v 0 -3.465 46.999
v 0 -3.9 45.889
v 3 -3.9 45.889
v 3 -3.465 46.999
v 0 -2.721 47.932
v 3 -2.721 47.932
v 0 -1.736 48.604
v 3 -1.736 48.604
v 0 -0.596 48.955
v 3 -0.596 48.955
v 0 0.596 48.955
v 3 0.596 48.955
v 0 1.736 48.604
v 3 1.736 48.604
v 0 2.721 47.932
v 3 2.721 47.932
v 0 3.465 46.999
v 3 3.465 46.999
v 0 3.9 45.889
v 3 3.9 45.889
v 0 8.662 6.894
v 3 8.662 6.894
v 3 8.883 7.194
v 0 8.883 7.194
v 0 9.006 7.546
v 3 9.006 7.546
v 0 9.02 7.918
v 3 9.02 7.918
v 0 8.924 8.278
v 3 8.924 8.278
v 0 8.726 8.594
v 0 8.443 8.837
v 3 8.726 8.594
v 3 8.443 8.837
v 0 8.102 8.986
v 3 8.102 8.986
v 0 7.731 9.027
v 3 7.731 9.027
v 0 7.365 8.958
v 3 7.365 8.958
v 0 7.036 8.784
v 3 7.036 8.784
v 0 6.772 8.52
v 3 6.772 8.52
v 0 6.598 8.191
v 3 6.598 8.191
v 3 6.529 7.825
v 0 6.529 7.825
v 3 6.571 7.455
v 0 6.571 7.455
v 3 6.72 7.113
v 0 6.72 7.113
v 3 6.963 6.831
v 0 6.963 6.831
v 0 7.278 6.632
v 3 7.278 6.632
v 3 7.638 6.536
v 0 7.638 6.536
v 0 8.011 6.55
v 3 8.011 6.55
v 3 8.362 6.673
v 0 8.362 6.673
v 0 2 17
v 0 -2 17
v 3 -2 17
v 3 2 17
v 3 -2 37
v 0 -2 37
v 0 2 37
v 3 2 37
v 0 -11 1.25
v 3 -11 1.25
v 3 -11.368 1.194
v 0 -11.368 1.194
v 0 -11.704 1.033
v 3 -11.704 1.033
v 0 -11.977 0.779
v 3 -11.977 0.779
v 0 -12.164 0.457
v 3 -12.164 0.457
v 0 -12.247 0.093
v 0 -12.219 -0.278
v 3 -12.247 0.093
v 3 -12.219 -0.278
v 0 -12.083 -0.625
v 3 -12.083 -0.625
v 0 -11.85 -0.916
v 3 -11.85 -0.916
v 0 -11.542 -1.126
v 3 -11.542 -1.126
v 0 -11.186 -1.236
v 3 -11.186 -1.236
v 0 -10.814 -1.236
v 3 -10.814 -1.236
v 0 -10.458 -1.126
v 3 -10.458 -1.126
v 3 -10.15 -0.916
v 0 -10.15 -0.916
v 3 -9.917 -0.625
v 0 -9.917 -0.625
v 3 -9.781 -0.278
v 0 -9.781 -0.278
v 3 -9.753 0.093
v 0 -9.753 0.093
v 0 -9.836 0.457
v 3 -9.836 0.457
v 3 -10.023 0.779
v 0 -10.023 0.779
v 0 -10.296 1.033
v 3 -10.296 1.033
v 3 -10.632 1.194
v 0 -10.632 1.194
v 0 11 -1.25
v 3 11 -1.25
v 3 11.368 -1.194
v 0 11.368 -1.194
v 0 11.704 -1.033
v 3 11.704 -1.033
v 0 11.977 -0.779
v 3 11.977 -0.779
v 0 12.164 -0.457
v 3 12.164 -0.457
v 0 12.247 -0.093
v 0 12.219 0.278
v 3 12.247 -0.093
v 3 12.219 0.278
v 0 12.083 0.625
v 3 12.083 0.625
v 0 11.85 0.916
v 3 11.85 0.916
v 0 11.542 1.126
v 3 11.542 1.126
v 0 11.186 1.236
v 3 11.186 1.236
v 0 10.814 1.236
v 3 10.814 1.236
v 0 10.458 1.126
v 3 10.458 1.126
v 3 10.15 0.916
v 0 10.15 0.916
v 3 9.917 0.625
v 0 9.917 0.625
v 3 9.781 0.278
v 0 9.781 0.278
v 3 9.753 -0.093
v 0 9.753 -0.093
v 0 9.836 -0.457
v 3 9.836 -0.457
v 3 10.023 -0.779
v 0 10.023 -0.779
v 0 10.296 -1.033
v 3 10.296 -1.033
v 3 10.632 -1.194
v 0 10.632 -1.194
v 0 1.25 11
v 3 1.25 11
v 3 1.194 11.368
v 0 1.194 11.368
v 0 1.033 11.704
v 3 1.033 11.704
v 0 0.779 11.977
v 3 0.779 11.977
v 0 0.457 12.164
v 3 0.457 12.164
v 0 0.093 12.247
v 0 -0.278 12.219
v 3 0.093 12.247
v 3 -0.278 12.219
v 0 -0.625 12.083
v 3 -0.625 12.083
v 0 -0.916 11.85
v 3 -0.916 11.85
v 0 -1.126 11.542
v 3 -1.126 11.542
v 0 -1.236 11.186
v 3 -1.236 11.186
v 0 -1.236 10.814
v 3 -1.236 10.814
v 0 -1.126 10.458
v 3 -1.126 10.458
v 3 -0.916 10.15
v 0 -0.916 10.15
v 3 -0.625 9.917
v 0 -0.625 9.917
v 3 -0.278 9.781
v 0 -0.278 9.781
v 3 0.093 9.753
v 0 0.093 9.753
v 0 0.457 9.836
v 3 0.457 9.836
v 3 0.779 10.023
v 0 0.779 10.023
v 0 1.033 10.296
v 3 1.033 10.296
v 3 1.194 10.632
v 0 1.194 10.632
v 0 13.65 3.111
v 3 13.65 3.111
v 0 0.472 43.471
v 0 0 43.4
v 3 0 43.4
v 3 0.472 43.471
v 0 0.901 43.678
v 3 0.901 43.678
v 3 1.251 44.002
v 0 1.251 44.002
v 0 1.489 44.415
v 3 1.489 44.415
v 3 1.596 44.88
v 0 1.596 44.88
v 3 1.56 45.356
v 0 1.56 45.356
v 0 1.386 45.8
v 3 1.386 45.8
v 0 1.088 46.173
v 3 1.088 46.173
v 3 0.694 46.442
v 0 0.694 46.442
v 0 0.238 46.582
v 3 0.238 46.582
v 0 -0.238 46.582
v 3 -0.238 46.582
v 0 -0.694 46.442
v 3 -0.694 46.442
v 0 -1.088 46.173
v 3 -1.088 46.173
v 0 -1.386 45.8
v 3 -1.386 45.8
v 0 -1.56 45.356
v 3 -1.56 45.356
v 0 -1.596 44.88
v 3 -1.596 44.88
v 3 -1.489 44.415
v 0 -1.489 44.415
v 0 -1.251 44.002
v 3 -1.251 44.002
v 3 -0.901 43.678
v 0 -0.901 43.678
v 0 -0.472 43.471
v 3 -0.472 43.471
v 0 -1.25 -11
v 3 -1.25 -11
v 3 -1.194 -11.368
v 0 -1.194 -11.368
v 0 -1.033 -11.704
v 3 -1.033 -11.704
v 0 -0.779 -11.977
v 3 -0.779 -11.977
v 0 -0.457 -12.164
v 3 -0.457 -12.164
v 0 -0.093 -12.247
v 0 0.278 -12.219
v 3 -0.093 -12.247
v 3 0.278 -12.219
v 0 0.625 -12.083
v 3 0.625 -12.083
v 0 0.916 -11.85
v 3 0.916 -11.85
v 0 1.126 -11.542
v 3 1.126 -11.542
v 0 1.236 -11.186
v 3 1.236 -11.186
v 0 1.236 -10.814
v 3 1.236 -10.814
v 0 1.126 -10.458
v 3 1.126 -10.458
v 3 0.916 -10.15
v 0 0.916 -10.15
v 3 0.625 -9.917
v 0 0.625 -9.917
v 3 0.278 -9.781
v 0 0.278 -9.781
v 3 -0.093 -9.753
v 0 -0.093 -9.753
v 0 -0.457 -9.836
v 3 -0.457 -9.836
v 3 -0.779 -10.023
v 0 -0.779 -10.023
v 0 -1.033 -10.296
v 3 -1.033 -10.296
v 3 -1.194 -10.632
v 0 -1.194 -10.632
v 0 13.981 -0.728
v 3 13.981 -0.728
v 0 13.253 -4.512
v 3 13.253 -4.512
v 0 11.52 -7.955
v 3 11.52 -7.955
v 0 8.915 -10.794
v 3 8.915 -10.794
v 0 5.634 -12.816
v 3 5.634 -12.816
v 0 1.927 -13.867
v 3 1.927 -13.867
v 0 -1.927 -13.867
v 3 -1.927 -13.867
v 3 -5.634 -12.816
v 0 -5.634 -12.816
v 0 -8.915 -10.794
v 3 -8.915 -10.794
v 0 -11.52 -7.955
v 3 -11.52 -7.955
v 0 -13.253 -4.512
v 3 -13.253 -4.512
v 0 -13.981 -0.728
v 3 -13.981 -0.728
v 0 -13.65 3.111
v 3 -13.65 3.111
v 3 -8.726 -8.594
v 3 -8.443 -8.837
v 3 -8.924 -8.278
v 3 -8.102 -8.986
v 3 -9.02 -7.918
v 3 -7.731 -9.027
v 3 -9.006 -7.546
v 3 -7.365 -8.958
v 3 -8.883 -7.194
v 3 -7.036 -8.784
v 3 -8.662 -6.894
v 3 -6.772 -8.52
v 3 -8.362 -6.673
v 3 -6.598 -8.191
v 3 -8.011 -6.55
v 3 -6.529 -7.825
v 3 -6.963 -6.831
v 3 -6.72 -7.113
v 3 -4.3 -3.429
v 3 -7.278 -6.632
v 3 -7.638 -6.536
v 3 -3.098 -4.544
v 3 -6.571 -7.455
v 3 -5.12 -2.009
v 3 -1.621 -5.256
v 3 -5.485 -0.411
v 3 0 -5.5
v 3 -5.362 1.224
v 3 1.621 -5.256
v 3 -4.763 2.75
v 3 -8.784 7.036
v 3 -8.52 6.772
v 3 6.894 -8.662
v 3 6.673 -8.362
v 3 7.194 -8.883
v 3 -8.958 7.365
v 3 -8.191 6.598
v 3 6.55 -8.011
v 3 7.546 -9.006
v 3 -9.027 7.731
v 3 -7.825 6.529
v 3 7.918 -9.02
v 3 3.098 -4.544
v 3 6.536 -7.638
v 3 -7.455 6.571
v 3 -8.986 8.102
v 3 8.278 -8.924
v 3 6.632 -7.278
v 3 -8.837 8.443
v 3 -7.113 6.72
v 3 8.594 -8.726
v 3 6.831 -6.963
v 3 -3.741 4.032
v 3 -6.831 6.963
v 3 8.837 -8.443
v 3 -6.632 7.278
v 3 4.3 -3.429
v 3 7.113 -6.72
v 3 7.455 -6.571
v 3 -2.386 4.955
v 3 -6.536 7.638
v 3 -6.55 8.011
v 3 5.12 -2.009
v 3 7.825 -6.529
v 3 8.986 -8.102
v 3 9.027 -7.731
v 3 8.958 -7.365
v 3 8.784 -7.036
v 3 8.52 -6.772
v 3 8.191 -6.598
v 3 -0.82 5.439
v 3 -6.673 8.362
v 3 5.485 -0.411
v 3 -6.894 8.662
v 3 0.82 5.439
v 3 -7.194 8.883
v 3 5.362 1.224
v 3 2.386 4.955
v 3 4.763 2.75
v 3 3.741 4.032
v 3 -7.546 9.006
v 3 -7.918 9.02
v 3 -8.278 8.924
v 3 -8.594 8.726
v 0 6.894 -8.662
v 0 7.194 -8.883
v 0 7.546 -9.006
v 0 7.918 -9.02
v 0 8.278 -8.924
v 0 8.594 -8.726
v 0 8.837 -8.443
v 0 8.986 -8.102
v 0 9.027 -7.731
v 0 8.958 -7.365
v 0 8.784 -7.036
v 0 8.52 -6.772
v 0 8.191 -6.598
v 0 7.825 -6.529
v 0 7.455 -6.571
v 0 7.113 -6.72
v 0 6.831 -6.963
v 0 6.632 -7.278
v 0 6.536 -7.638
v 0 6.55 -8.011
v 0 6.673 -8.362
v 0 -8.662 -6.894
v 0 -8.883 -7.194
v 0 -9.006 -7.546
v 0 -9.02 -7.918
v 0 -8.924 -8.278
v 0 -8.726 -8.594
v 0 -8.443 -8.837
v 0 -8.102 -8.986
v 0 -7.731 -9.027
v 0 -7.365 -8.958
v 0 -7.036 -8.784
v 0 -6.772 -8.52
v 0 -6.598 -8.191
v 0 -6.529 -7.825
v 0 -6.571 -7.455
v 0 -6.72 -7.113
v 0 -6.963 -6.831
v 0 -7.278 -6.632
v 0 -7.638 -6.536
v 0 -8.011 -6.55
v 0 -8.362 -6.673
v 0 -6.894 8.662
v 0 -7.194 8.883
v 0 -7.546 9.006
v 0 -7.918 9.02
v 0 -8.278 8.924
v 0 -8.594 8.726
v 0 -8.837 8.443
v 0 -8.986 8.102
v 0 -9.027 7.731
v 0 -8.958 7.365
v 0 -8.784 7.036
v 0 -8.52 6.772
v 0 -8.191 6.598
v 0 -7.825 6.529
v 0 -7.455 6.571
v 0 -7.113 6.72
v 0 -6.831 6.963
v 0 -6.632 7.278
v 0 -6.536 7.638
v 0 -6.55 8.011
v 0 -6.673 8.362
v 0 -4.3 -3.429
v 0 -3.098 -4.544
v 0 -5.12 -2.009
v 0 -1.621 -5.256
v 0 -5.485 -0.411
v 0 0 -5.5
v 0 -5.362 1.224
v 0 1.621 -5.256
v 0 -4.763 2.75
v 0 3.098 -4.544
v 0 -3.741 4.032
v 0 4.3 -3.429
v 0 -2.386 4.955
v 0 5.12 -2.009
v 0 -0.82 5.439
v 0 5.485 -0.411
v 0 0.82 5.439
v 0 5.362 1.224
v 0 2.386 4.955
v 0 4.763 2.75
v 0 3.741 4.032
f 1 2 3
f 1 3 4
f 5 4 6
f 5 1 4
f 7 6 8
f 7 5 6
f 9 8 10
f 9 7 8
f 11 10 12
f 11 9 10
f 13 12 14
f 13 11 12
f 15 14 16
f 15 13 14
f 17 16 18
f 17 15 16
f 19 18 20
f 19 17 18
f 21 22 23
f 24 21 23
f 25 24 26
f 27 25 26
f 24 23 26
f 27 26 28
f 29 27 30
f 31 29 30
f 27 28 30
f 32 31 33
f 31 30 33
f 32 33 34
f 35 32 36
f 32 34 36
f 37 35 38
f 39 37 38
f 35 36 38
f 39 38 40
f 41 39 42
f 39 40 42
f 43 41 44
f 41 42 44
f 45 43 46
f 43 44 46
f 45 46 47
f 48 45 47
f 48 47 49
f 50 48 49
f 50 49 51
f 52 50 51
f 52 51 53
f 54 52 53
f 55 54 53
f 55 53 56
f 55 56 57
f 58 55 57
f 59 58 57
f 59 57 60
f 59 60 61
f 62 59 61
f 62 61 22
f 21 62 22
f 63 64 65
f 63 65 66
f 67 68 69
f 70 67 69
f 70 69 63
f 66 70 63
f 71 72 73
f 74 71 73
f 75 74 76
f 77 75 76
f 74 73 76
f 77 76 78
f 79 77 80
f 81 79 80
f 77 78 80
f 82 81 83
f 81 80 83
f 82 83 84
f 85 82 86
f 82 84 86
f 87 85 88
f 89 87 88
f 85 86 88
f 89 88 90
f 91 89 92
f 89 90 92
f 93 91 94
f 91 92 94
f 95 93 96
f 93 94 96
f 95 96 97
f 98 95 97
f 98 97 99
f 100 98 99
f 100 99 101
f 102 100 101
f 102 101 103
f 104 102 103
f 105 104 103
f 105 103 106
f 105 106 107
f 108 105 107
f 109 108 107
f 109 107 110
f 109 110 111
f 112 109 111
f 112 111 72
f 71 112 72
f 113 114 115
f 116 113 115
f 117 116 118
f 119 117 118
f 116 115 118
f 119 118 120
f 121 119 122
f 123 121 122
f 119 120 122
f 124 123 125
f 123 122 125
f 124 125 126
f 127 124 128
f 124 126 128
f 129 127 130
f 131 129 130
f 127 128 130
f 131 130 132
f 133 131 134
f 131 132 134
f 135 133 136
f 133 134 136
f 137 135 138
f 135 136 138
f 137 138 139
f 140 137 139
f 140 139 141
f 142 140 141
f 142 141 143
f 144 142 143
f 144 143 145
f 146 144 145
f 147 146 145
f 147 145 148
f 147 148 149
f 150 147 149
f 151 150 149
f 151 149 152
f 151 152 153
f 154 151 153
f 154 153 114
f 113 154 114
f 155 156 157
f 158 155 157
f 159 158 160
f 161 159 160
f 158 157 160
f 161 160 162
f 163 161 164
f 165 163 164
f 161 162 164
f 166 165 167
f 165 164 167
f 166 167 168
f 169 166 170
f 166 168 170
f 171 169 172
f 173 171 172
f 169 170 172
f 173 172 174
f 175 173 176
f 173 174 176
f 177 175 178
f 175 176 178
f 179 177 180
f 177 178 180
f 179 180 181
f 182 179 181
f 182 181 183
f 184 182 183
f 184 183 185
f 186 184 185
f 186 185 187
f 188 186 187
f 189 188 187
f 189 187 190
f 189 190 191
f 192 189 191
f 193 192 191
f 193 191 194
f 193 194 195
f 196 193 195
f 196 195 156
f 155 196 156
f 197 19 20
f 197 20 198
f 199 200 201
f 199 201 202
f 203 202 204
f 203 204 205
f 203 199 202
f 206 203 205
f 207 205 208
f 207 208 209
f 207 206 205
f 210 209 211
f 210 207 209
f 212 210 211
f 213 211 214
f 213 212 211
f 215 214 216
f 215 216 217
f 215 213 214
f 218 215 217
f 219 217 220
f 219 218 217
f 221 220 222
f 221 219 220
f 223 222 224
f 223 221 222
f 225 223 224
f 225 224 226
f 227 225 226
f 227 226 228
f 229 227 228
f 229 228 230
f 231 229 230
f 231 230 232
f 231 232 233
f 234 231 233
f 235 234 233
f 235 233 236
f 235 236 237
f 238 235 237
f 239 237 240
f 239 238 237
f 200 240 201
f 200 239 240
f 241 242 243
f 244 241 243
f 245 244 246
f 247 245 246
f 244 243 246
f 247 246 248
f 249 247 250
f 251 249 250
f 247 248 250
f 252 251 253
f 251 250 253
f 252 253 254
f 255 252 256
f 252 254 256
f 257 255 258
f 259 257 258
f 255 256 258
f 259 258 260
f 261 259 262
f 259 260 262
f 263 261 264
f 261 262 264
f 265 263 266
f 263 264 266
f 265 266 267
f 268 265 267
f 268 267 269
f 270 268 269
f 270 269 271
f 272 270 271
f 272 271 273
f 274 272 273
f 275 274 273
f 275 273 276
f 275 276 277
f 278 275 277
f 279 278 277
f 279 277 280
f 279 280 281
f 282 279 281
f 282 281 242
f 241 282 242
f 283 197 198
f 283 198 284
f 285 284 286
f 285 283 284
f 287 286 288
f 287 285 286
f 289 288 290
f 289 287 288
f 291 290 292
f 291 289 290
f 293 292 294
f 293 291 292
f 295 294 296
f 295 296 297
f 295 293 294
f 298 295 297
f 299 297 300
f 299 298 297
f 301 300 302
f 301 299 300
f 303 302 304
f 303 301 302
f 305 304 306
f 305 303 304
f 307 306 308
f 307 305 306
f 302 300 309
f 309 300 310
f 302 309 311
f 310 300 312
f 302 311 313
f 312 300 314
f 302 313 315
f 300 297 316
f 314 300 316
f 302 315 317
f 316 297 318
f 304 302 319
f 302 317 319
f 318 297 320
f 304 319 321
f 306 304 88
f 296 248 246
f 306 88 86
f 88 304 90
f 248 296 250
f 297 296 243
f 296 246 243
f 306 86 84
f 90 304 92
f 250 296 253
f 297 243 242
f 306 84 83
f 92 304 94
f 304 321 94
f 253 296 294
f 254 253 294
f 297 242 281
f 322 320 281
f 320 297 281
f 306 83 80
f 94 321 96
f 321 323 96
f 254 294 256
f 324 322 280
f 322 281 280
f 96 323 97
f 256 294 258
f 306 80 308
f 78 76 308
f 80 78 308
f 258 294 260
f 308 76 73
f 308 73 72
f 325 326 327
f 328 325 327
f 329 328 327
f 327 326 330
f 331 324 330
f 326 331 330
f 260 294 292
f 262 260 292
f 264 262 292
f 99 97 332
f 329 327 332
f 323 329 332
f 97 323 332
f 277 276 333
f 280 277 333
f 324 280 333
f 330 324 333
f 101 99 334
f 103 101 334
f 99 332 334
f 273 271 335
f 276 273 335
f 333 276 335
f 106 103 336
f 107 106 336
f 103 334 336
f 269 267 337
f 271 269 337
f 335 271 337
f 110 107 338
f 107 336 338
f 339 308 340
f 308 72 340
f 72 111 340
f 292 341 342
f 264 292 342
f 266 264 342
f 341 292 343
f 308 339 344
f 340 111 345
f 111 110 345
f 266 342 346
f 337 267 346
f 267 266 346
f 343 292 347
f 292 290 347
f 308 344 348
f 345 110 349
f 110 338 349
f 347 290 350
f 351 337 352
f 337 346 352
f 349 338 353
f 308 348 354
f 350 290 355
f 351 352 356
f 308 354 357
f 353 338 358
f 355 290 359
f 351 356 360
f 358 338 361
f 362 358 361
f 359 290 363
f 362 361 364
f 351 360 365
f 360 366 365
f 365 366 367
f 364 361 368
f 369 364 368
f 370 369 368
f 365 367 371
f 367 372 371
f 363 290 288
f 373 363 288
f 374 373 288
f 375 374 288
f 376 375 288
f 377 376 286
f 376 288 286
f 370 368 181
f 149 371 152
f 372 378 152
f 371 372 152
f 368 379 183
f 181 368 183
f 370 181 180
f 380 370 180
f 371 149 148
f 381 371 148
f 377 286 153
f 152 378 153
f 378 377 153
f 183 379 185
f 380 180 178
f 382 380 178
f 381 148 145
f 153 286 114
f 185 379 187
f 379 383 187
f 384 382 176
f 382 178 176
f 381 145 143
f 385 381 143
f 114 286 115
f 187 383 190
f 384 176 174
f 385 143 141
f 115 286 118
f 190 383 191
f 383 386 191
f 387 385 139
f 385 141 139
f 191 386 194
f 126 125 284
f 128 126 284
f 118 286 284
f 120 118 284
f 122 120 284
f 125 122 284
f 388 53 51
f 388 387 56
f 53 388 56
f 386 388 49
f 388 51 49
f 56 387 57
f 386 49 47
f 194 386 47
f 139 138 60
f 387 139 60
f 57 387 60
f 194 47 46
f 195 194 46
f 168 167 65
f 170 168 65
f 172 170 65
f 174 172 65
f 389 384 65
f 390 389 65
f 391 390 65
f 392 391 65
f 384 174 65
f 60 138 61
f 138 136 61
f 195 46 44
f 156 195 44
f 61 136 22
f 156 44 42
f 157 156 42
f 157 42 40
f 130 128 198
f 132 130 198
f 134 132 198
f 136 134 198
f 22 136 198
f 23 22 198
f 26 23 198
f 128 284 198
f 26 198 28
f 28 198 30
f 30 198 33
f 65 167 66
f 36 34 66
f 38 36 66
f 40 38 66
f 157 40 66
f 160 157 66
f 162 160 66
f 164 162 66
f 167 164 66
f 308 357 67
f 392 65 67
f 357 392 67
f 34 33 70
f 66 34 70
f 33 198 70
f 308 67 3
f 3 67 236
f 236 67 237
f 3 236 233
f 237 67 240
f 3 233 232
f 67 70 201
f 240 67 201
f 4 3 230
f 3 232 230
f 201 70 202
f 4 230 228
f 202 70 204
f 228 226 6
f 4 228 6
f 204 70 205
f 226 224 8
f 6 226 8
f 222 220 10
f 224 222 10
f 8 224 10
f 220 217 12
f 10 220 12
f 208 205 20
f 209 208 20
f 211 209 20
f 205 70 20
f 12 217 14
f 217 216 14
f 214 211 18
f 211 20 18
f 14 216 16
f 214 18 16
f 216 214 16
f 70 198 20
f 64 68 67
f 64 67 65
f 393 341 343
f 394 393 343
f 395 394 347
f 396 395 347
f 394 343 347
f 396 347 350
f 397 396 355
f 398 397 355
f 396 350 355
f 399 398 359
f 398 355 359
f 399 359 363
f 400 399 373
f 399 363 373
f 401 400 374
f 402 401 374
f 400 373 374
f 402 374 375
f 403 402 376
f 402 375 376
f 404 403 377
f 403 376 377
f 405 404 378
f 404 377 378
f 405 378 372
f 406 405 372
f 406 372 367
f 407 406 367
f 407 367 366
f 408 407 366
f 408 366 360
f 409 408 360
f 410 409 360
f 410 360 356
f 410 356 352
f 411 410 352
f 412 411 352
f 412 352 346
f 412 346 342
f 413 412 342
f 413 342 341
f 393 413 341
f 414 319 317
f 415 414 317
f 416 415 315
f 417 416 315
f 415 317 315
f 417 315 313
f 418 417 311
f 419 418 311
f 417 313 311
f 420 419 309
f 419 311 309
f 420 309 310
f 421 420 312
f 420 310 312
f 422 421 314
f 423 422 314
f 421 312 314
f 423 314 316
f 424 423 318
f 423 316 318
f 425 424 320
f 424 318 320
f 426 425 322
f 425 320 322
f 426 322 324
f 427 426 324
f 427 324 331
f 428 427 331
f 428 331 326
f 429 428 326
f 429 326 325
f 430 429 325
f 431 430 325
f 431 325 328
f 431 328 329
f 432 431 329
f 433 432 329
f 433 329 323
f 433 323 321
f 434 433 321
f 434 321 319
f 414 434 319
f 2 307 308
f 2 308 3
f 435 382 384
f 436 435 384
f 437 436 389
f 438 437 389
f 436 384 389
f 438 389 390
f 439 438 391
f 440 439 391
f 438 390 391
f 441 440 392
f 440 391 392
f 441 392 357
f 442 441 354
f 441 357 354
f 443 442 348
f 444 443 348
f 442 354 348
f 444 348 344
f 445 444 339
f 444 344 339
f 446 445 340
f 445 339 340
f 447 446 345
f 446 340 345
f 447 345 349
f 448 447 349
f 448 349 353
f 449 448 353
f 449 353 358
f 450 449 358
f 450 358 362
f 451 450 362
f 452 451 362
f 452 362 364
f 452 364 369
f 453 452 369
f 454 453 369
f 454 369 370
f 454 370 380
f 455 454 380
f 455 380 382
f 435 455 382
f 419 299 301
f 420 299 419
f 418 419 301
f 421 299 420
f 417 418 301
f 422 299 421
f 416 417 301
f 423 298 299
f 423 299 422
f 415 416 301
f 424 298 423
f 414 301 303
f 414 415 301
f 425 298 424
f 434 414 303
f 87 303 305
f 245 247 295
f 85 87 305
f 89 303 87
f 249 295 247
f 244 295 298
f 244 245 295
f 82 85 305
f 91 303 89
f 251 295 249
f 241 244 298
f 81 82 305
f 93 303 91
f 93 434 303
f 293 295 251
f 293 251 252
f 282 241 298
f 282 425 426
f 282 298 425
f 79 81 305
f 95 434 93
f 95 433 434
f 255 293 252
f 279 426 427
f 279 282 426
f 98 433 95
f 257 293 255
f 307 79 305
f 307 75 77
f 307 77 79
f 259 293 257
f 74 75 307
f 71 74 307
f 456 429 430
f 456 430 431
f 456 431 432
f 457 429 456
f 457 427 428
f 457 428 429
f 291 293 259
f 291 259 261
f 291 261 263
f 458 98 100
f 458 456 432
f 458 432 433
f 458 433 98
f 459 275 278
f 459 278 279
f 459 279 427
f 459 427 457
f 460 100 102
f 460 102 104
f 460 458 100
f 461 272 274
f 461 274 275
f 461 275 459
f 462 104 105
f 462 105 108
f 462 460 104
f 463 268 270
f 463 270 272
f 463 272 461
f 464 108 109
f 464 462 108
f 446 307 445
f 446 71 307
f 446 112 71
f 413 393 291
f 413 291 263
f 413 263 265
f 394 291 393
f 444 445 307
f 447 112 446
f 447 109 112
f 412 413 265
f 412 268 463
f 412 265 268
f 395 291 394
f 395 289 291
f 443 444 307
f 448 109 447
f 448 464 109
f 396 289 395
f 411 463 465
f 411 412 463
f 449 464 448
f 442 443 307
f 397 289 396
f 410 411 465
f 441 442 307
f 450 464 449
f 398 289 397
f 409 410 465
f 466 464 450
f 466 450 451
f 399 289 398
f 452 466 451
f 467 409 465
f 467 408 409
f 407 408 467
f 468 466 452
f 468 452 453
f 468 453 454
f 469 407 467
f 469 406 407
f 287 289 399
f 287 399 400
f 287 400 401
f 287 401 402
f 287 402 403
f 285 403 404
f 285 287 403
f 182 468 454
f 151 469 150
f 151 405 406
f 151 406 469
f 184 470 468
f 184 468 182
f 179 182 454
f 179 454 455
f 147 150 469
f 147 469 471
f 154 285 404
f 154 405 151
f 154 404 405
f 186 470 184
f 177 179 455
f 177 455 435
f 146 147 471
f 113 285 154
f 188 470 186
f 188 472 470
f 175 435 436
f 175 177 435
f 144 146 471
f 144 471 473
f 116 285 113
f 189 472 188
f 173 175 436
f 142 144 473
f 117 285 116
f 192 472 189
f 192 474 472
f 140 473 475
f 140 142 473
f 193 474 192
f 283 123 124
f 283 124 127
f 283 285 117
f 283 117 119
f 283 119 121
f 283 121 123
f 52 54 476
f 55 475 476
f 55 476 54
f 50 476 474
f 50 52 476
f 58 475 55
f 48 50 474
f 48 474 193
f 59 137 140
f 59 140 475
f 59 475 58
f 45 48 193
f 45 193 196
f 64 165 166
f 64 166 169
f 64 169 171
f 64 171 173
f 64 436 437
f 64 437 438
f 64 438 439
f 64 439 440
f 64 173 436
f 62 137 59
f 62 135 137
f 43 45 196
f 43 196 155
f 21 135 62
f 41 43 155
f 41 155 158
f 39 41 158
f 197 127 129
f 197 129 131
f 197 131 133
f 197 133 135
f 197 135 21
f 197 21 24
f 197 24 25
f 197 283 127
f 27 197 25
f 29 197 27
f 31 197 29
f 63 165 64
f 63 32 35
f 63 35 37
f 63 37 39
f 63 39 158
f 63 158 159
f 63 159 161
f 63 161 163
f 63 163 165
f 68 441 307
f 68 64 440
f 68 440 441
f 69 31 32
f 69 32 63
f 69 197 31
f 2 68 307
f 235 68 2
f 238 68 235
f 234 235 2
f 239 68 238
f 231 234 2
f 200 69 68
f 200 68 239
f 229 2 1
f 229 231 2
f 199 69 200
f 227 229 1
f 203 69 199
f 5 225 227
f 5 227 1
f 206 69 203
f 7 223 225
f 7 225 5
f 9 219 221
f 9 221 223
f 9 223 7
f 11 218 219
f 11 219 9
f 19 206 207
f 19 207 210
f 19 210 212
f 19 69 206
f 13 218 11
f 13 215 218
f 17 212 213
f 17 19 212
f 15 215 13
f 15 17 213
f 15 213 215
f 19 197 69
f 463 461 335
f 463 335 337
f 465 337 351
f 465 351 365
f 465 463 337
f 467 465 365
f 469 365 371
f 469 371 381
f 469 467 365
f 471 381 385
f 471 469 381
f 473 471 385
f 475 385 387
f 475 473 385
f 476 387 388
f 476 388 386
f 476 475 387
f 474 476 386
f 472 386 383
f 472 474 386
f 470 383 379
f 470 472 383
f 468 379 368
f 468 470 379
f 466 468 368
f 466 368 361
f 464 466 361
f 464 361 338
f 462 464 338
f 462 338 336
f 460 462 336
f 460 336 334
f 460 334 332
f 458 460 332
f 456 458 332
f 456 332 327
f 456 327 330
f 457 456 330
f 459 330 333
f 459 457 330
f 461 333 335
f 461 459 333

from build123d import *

# Parameters (mm, degrees)
SKETCH1_R           = 1.6
SKETCH1_R_2         = 5.5
SKETCH1_W           = 20
SKETCH1_H           = 4
BOSS_EXTRUDE1_DEPTH = 3
CUT_EXTRUDE1_REACH  = 53.049
SKETCH2_R           = 1.25
CIRPATTERN1_COUNT   = 8


with BuildPart() as part:
    # Sketch1 → Boss-Extrude1 (new body)
    with BuildSketch(Plane(origin=(0, 0, 0), x_dir=(0, 0, -1), z_dir=(1, 0, 0))):
        with BuildLine():
            Line((-45.888888889, 3.899984172), (-3.111111111, 13.649944603))
            ThreePointArc((-3.111111111, 13.649944603), (14, 0), (-3.111111111, -13.649944603))
            Line((-3.111111111, -13.649944603), (-45.888888889, -3.899984172))
            ThreePointArc((-45.888888889, -3.899984172), (-49, 0), (-45.888888889, 3.899984172))
        make_face()
        with Locations((-45, 0)):
            Circle(SKETCH1_R, mode=Mode.SUBTRACT)
        Circle(SKETCH1_R_2, mode=Mode.SUBTRACT)
        with Locations((-27, 0)):
            Rectangle(SKETCH1_W, SKETCH1_H, mode=Mode.SUBTRACT)
    extrude(amount=BOSS_EXTRUDE1_DEPTH)

    # Sketch2 → Cut-Extrude1 (cut, up to next)
    with BuildSketch(Plane(origin=(3, 0, 0), x_dir=(0, 0, -1), z_dir=(1, 0, 0)), mode=Mode.PRIVATE) as cut_extrude1_sk1:
        with Locations((0, 11)):
            Circle(SKETCH2_R)
    cut_extrude1_tool1 = extrude(cut_extrude1_sk1.sketch, amount=-CUT_EXTRUDE1_REACH, mode=Mode.PRIVATE) & part.part
    cut_extrude1 = cut_extrude1_tool1.solids().sort_by_distance((3, 11, 0))[0]
    add(cut_extrude1, mode=Mode.SUBTRACT)

    # CirPattern1: Cut-Extrude1 ×8 about axis
    cirpattern1_axis = Axis((0, 0, 0), (1, 0, 0))
    for i in range(1, CIRPATTERN1_COUNT):
        add(cut_extrude1.rotate(cirpattern1_axis, i * 360 / CIRPATTERN1_COUNT), mode=Mode.SUBTRACT)


solid = part.part
